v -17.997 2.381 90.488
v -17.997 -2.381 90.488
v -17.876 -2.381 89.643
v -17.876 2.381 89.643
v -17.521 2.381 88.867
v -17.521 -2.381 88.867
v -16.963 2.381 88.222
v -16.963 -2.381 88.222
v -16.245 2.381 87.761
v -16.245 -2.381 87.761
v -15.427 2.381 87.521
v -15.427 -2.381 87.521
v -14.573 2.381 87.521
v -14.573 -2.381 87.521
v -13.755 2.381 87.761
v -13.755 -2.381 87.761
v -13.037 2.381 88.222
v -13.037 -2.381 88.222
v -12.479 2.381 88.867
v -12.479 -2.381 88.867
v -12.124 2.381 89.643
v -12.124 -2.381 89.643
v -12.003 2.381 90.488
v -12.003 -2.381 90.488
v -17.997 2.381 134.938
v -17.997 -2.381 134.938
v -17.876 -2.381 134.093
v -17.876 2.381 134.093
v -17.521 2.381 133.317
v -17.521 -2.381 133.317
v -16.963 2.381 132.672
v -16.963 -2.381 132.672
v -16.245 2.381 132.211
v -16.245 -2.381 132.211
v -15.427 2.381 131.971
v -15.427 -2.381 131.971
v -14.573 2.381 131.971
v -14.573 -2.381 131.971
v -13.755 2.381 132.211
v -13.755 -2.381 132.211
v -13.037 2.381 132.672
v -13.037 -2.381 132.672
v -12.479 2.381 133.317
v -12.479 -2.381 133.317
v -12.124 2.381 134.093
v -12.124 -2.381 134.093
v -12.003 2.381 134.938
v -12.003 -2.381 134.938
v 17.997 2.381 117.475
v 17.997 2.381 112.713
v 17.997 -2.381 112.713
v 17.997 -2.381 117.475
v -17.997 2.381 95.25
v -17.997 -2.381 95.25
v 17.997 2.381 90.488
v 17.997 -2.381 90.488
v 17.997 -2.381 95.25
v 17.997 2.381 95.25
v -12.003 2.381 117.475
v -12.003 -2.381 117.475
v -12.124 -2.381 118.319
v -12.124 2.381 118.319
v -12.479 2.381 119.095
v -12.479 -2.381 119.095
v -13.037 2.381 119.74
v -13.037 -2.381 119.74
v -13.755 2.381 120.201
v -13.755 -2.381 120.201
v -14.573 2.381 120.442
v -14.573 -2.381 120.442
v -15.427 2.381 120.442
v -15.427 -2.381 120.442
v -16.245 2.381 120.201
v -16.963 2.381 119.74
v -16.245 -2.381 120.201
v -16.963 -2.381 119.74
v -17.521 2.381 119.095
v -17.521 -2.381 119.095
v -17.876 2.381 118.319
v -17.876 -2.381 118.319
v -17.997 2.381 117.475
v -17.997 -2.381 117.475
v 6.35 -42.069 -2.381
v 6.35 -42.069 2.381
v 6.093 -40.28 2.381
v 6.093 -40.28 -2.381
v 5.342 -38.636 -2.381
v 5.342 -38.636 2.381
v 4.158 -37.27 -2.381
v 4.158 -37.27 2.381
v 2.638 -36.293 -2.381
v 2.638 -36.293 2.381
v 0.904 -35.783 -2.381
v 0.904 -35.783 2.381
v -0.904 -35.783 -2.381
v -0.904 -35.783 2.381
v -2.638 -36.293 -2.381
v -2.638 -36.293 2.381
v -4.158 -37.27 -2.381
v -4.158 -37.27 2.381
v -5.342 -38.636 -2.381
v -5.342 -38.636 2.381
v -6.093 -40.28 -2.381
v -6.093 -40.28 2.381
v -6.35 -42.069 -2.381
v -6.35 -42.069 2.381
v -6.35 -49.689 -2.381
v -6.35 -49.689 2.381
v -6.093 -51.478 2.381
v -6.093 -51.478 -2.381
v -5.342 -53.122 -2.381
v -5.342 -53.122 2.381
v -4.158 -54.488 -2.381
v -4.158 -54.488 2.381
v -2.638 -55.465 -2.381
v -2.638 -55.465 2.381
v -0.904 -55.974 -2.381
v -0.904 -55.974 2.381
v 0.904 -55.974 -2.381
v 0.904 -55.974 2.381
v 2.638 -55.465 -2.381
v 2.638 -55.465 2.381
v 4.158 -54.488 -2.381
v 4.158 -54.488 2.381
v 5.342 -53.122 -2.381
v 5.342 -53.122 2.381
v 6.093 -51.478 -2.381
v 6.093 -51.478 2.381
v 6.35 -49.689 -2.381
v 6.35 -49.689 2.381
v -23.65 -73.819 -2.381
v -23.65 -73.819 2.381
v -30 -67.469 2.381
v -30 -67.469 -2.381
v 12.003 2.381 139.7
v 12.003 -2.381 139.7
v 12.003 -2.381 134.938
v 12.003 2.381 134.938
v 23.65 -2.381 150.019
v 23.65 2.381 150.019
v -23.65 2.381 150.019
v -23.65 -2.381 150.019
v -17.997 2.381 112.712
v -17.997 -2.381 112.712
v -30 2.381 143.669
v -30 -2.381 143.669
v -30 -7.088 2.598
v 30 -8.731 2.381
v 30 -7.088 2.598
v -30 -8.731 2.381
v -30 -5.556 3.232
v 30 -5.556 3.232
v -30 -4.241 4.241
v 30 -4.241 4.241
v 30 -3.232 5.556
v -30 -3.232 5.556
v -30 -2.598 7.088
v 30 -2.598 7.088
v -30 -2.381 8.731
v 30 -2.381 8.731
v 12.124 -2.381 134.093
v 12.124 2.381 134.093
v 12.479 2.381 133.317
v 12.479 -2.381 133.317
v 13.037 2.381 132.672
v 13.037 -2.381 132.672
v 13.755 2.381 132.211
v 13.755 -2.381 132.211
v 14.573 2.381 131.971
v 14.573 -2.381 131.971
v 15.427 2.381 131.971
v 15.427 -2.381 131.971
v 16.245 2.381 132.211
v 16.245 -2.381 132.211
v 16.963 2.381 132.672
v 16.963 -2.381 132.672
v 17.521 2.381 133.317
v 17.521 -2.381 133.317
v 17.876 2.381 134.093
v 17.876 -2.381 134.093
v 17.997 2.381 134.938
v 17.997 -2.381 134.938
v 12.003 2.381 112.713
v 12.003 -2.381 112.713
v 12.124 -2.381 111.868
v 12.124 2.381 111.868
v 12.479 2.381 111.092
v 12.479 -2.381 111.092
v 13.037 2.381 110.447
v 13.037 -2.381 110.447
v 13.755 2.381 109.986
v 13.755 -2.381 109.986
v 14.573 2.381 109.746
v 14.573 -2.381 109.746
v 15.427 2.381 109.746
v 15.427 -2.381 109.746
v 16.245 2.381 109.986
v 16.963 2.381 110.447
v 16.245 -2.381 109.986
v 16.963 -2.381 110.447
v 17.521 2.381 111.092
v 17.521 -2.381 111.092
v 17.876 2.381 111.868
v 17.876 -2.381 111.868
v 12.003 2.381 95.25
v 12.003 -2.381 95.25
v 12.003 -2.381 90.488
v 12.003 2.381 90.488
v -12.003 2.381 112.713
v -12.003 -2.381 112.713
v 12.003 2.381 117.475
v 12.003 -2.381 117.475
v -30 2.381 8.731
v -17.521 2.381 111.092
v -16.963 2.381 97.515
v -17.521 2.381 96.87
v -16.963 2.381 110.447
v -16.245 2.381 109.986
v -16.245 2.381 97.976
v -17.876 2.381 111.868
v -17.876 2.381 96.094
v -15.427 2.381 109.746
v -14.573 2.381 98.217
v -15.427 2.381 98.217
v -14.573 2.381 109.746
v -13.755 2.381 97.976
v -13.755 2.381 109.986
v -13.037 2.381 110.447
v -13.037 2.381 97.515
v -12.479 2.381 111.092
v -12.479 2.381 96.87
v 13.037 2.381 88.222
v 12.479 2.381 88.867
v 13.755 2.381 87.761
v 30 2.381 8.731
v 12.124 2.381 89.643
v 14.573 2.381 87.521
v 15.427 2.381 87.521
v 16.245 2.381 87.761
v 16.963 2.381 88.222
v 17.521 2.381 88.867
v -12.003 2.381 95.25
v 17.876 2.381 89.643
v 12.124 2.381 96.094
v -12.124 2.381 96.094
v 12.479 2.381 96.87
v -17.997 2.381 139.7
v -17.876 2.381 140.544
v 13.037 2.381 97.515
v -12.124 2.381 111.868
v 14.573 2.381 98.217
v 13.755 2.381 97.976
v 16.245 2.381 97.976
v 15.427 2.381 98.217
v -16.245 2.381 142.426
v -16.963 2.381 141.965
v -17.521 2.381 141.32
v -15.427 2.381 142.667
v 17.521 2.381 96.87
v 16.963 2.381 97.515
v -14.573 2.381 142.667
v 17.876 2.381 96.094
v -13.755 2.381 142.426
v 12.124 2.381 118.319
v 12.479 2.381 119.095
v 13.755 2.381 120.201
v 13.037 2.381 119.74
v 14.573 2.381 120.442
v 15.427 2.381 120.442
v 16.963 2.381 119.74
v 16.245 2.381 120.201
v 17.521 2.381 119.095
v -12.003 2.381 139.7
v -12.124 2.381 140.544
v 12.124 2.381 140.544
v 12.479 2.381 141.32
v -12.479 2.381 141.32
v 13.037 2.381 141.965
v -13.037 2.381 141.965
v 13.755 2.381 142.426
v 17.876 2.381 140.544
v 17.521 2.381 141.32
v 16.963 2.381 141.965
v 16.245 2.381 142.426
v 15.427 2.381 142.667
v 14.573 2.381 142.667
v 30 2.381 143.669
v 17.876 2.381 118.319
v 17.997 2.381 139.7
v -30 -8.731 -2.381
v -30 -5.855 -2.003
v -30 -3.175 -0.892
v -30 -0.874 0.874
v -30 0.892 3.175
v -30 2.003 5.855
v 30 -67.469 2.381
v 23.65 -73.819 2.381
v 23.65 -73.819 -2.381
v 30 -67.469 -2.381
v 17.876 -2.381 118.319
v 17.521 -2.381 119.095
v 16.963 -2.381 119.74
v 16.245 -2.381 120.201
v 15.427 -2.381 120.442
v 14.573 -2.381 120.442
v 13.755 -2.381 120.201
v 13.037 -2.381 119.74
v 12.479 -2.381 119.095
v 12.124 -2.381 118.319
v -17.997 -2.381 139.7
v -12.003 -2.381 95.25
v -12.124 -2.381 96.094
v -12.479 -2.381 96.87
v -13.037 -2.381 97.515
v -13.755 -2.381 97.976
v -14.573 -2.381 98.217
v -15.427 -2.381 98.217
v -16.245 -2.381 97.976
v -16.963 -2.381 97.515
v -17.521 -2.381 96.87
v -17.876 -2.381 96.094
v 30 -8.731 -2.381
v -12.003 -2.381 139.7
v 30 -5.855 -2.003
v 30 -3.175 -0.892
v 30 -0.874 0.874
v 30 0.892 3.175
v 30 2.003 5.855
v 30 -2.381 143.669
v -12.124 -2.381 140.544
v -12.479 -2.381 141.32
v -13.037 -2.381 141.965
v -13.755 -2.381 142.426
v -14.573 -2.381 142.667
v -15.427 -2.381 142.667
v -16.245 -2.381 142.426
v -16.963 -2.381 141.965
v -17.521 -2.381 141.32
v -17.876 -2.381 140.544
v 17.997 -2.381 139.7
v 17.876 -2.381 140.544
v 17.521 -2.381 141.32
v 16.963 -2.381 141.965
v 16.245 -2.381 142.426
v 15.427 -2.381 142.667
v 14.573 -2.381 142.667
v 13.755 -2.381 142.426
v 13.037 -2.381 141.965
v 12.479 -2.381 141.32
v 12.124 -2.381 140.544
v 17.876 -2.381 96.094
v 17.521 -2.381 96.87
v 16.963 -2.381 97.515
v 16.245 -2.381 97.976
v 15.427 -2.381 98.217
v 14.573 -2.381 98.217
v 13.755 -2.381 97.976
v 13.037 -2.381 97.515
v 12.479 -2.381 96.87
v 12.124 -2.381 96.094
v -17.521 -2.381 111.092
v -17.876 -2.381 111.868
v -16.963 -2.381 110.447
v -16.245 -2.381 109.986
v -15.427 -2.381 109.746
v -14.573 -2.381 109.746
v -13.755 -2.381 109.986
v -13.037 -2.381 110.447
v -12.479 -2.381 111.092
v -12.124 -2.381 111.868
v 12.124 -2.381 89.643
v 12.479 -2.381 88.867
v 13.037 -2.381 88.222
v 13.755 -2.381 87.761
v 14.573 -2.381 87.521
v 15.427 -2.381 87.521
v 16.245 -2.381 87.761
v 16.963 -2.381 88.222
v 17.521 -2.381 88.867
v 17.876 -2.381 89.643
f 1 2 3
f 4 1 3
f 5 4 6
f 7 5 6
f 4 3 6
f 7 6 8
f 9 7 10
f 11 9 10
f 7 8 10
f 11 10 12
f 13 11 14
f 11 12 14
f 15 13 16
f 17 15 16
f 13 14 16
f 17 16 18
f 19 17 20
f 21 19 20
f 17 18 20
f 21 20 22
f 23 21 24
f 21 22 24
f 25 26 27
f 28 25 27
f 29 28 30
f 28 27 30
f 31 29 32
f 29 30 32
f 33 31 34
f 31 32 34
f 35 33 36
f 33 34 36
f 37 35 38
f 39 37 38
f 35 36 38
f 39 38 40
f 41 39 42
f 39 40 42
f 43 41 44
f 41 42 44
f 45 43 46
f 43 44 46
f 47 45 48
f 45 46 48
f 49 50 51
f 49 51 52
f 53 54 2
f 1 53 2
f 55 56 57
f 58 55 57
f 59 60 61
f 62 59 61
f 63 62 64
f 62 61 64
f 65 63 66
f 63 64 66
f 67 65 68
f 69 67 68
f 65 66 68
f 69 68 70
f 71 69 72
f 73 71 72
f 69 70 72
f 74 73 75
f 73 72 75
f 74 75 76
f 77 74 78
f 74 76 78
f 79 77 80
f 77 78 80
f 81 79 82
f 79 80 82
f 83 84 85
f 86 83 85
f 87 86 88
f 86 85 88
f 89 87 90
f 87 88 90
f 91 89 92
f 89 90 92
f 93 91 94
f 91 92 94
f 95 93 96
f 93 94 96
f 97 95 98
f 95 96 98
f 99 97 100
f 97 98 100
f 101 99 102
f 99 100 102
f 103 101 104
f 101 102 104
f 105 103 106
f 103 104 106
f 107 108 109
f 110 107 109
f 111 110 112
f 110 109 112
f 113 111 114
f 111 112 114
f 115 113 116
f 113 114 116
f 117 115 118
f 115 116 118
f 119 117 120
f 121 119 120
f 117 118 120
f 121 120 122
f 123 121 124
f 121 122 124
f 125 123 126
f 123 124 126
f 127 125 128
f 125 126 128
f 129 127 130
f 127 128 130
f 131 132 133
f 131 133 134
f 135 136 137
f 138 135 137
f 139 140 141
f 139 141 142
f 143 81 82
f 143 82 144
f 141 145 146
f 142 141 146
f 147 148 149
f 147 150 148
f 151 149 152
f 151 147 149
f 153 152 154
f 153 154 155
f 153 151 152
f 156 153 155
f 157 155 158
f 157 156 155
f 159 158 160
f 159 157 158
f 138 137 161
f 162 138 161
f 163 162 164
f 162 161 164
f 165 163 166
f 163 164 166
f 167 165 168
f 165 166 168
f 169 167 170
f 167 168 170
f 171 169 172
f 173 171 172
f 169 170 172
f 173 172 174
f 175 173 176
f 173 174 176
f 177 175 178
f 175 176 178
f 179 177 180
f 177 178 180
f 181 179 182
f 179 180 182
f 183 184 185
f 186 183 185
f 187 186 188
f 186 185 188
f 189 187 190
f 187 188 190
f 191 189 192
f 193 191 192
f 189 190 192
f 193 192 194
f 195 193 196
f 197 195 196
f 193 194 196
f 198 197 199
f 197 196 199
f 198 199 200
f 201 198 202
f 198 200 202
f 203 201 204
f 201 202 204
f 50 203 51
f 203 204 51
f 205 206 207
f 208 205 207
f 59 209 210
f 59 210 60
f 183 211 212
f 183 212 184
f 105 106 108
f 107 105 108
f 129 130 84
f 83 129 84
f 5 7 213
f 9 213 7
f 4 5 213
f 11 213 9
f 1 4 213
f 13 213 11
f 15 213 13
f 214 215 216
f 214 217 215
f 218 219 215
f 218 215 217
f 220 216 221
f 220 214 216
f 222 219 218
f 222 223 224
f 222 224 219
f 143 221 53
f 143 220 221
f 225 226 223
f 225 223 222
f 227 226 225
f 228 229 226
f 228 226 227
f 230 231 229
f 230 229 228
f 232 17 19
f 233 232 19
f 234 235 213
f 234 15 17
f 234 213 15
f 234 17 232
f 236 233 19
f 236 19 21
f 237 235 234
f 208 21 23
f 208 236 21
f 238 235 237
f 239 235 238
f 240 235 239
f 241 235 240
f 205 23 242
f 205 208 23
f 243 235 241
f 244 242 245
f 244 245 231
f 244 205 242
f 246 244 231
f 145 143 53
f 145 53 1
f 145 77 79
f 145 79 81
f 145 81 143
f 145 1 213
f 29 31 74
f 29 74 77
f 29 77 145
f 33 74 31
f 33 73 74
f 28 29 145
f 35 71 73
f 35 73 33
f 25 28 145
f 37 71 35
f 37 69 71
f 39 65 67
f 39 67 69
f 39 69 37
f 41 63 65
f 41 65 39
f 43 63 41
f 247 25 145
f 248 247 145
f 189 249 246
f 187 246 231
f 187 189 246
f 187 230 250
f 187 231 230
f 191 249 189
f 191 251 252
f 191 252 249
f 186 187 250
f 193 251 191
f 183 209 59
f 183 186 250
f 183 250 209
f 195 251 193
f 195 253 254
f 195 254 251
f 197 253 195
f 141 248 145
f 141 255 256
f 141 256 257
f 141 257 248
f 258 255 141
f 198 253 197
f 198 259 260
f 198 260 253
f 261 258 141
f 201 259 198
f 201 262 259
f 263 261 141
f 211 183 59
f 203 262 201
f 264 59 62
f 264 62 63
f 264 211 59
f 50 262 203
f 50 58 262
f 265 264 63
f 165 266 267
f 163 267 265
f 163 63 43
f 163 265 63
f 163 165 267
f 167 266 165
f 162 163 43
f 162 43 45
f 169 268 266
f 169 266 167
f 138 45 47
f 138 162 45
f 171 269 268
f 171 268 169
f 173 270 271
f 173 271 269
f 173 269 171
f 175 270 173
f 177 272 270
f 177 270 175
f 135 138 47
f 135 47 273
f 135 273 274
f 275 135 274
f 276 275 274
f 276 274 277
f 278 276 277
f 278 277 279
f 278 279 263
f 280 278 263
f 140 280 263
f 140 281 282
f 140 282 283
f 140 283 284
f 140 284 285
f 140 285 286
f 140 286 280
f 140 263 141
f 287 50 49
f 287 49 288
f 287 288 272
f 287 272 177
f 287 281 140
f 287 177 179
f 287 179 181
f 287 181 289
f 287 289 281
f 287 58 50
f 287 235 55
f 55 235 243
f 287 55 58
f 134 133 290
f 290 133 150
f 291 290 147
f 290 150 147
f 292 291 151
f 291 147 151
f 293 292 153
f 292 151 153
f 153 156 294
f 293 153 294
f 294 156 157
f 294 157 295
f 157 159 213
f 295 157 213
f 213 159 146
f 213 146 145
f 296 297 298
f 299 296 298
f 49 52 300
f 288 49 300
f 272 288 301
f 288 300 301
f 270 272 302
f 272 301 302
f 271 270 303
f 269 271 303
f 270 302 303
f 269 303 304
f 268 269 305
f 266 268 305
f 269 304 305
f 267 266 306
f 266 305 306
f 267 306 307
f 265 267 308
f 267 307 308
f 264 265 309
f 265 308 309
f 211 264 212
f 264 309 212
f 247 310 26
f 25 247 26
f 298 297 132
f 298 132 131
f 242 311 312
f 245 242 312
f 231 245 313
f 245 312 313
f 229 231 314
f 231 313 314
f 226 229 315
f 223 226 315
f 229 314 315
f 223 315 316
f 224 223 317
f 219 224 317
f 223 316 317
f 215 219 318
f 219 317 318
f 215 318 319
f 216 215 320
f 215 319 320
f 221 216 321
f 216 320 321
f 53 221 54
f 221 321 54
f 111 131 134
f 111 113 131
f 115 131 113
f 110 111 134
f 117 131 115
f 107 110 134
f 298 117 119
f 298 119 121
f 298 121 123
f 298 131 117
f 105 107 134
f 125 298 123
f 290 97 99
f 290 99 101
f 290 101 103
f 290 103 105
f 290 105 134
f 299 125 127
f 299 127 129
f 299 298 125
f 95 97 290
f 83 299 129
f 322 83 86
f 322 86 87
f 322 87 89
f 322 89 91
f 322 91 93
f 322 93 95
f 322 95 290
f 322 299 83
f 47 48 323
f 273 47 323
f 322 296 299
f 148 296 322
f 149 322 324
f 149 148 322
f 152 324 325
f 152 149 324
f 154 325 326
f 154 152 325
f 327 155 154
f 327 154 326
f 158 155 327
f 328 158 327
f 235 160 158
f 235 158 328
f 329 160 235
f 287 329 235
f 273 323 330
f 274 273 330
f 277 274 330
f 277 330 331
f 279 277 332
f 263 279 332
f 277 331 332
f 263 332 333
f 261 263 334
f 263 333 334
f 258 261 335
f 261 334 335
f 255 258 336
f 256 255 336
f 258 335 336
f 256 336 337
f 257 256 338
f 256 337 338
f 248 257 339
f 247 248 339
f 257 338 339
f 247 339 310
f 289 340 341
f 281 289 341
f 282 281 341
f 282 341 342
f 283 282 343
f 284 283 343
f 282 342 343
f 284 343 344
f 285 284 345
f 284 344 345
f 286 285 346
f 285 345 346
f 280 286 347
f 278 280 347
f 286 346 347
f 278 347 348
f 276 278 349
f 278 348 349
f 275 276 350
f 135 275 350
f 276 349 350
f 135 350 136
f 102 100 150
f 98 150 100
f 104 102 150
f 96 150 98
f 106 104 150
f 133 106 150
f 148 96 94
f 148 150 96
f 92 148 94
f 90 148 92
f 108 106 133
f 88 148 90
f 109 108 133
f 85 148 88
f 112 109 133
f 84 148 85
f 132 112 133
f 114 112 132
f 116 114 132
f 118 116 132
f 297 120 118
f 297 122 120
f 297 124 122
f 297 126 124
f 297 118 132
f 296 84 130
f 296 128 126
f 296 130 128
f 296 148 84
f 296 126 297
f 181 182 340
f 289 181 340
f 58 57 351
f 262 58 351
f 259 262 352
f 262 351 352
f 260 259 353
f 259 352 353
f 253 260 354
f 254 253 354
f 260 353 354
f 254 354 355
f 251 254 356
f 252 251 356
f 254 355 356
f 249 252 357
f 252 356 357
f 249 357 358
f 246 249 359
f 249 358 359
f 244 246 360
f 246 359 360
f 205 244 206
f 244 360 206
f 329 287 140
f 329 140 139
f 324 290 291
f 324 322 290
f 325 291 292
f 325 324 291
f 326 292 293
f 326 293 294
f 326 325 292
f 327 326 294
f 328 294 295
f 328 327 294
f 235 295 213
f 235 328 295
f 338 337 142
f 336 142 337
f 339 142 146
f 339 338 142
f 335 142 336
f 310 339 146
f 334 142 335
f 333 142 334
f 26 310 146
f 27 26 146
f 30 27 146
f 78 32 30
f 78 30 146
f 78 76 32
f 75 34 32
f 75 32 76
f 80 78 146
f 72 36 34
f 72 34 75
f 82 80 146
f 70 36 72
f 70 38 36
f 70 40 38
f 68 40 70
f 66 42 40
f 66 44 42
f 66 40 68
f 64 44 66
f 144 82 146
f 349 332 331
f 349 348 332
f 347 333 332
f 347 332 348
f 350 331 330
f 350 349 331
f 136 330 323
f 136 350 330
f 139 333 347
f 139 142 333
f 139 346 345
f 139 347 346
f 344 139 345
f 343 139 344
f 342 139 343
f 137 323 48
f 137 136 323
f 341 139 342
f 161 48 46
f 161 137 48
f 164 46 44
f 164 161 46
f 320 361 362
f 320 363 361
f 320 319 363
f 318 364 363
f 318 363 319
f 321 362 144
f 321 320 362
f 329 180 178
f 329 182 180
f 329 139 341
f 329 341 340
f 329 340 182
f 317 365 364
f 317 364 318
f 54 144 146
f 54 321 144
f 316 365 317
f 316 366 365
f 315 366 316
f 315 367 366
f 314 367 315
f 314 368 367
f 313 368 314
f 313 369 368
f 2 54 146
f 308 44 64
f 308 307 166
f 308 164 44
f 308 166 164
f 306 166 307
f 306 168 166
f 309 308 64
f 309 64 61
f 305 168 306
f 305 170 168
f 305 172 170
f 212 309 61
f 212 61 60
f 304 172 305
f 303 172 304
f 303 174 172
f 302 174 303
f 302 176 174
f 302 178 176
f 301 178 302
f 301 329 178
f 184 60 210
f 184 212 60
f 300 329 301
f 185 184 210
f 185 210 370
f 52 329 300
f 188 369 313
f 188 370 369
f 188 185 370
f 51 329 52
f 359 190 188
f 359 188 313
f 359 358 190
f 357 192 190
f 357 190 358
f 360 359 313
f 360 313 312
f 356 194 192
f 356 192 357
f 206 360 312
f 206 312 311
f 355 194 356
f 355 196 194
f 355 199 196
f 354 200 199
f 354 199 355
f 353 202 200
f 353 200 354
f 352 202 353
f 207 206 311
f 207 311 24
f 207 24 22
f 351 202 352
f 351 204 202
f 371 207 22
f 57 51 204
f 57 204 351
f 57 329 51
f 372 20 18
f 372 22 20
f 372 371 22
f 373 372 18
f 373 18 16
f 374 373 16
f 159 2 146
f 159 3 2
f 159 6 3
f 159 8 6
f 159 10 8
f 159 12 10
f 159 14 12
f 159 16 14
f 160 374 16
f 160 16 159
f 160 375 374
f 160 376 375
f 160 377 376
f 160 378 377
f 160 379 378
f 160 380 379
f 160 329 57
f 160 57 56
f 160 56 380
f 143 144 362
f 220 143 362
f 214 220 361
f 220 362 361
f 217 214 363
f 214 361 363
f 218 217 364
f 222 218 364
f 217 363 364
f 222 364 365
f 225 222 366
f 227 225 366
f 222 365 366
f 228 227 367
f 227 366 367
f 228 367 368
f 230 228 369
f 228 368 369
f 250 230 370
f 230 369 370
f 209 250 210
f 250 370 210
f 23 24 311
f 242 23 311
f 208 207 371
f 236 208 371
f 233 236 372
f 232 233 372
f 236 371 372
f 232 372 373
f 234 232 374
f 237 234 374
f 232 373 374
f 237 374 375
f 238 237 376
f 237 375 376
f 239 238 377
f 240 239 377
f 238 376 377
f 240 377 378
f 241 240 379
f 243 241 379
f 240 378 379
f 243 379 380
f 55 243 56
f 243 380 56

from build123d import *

# Parameters (mm, degrees)
F1_DEPTH = 30
F2_R     = 6.35
F3_R     = 11.1125
F4_SIZE  = 6.35
F6_DEPTH = 4.7635
F7_DEPTH = 4.7635
F9_DEPTH = 4.7635


with BuildPart() as f1:
    # F0 (on Right) → F1 (new body, symmetric)
    with BuildSketch(Plane.YZ):
        Polygon((-2.38125, 2.38125), (-73.81875, 2.38125), (-73.81875, -2.38125), (2.38125, -2.38125), (2.38125, 150.01875), (-2.38125, 150.01875), align=None)
    extrude(amount=F1_DEPTH, both=True)

    # F2
    f2_edges = [f1.edges().sort_by_distance(p)[0] for p in [
        (0, -2.38125, 2.38125),
    ]]
    fillet(f2_edges, radius=F2_R)

    # F3
    f3_edges = [f1.edges().sort_by_distance(p)[0] for p in [
        (0, 2.38125, -2.38125),
    ]]
    fillet(f3_edges, radius=F3_R)

    # F4
    f4_edges = [f1.edges().sort_by_distance(p)[0] for p in [
        (30, 0, 150.01875),
        (-30, 0, 150.01875),
        (-30, -73.81875, 0),
        (30, -73.81875, 0),
    ]]
    chamfer(f4_edges, length=F4_SIZE)

    # F5 (on face) → F6 (cut, through all)
    with BuildSketch(Plane.XY.offset(2.38125)):
        with BuildLine():
            ThreePointArc((5.08, -45.87875), (6.0241389426, -44.0767963142), (6.35, -42.06875))
            ThreePointArc((6.35, -42.06875), (0, -35.71875), (-6.35, -42.06875))
            ThreePointArc((-6.35, -42.06875), (-6.0241389426, -44.0767963142), (-5.08, -45.87875))
            ThreePointArc((-5.08, -45.87875), (0, -43.33875), (5.08, -45.87875))
        make_face()
        with BuildLine():
            Line((6.35, -49.68875), (6.35, -42.06875))
            ThreePointArc((6.35, -42.06875), (6.0241389426, -44.0767963142), (5.08, -45.87875))
            ThreePointArc((5.08, -45.87875), (6.0241389426, -47.6807036858), (6.35, -49.68875))
        make_face()
        with BuildLine():
            ThreePointArc((-5.08, -45.87875), (-6.0241389426, -44.0767963142), (-6.35, -42.06875))
            Line((-6.35, -42.06875), (-6.35, -49.68875))
            ThreePointArc((-6.35, -49.68875), (-6.0241389426, -47.6807036858), (-5.08, -45.87875))
        make_face()
        with BuildLine():
            ThreePointArc((6.35, -49.68875), (6.0241389426, -47.6807036858), (5.08, -45.87875))
            ThreePointArc((5.08, -45.87875), (0, -48.41875), (-5.08, -45.87875))
            ThreePointArc((-5.08, -45.87875), (-6.0241389426, -47.6807036858), (-6.35, -49.68875))
            ThreePointArc((-6.35, -49.68875), (0, -56.03875), (6.35, -49.68875))
        make_face()
    extrude(amount=-F6_DEPTH, mode=Mode.SUBTRACT)

    # F5 (on face) + F6_face (on face) → F7 (cut, through all)
    with BuildSketch(Plane.XY.offset(2.38125)):
        with BuildLine():
            ThreePointArc((5.08, -45.87875), (6.0241389426, -44.0767963142), (6.35, -42.06875))
            ThreePointArc((6.35, -42.06875), (0, -35.71875), (-6.35, -42.06875))
            ThreePointArc((-6.35, -42.06875), (-6.0241389426, -44.0767963142), (-5.08, -45.87875))
            ThreePointArc((-5.08, -45.87875), (0, -43.33875), (5.08, -45.87875))
        make_face()
        with BuildLine():
            Line((6.35, -49.68875), (6.35, -42.06875))
            ThreePointArc((6.35, -42.06875), (6.0241389426, -44.0767963142), (5.08, -45.87875))
            ThreePointArc((5.08, -45.87875), (6.0241389426, -47.6807036858), (6.35, -49.68875))
        make_face()
        with BuildLine():
            ThreePointArc((-5.08, -45.87875), (-6.0241389426, -44.0767963142), (-6.35, -42.06875))
            Line((-6.35, -42.06875), (-6.35, -49.68875))
            ThreePointArc((-6.35, -49.68875), (-6.0241389426, -47.6807036858), (-5.08, -45.87875))
        make_face()
        with BuildLine():
            ThreePointArc((6.35, -49.68875), (6.0241389426, -47.6807036858), (5.08, -45.87875))
            ThreePointArc((5.08, -45.87875), (0, -48.41875), (-5.08, -45.87875))
            ThreePointArc((-5.08, -45.87875), (-6.0241389426, -47.6807036858), (-6.35, -49.68875))
            ThreePointArc((-6.35, -49.68875), (0, -56.03875), (6.35, -49.68875))
        make_face()
    with BuildSketch(Plane(origin=(0, -45.87875, 2.38125), x_dir=(1, 0, 0), z_dir=(0, 0, 1))):
        with BuildLine():
            ThreePointArc((5.08, 0), (0, 2.54), (-5.08, 0))
            ThreePointArc((-5.08, 0), (0, -2.54), (5.08, 0))
        make_face()
    extrude(amount=-F7_DEPTH, mode=Mode.SUBTRACT)

    # F8 (on face) → F9 (cut, through all)
    with BuildSketch(Plane.XZ.offset(2.38125)):
        with BuildLine():
            ThreePointArc((-16.8201253466, 137.31875), (-17.686865044, 138.371856907), (-17.9972, 139.7))
            Line((-17.9972, 139.7), (-17.9972, 134.9375))
            ThreePointArc((-17.9972, 134.9375), (-17.686865044, 136.265643093), (-16.8201253466, 137.31875))
        make_face()
        with BuildLine():
            Line((-12.0028, 134.9375), (-12.0028, 139.7))
            ThreePointArc((-12.0028, 139.7), (-12.313134956, 138.371856907), (-13.1798746534, 137.31875))
            ThreePointArc((-13.1798746534, 137.31875), (-12.313134956, 136.265643093), (-12.0028, 134.9375))
        make_face()
        with BuildLine():
            ThreePointArc((-13.1798746534, 115.09375), (-12.313134956, 114.040643093), (-12.0028, 112.7125))
            Line((-12.0028, 112.7125), (-12.0028, 117.475))
            ThreePointArc((-12.0028, 117.475), (-12.313134956, 116.146856907), (-13.1798746534, 115.09375))
        make_face()
        with BuildLine():
            Line((-17.9972, 117.475), (-17.9972, 112.7125))
            ThreePointArc((-17.9972, 112.7125), (-17.686865044, 114.040643093), (-16.8201253466, 115.09375))
            ThreePointArc((-16.8201253466, 115.09375), (-17.686865044, 116.146856907), (-17.9972, 117.475))
        make_face()
        with BuildLine():
            ThreePointArc((-13.1798746534, 92.86875), (-12.313134956, 91.815643093), (-12.0028, 90.4875))
            Line((-12.0028, 90.4875), (-12.0028, 95.25))
            ThreePointArc((-12.0028, 95.25), (-12.313134956, 93.921856907), (-13.1798746534, 92.86875))
        make_face()
        with BuildLine():
            Line((-17.9972, 95.25), (-17.9972, 90.4875))
            ThreePointArc((-17.9972, 90.4875), (-17.686865044, 91.815643093), (-16.8201253466, 92.86875))
            ThreePointArc((-16.8201253466, 92.86875), (-17.686865044, 93.921856907), (-17.9972, 95.25))
        make_face()
        with BuildLine():
            ThreePointArc((13.1798746534, 92.86875), (12.313134956, 93.921856907), (12.0028, 95.25))
            Line((12.0028, 95.25), (12.0028, 90.4875))
            ThreePointArc((12.0028, 90.4875), (12.313134956, 91.815643093), (13.1798746534, 92.86875))
        make_face()
        with BuildLine():
            Line((17.9972, 90.4875), (17.9972, 95.25))
            ThreePointArc((17.9972, 95.25), (17.686865044, 93.921856907), (16.8201253466, 92.86875))
            ThreePointArc((16.8201253466, 92.86875), (17.686865044, 91.815643093), (17.9972, 90.4875))
        make_face()
        with BuildLine():
            Line((17.9972, 112.7125), (17.9972, 117.475))
            ThreePointArc((17.9972, 117.475), (17.686865044, 116.146856907), (16.8201253466, 115.09375))
            ThreePointArc((16.8201253466, 115.09375), (17.686865044, 114.040643093), (17.9972, 112.7125))
        make_face()
        with BuildLine():
            ThreePointArc((13.1798746534, 137.31875), (12.313134956, 138.371856907), (12.0028, 139.7))
            Line((12.0028, 139.7), (12.0028, 134.9375))
            ThreePointArc((12.0028, 134.9375), (12.313134956, 136.265643093), (13.1798746534, 137.31875))
        make_face()
        with BuildLine():
            Line((17.9972, 134.9375), (17.9972, 139.7))
            ThreePointArc((17.9972, 139.7), (17.686865044, 138.371856907), (16.8201253466, 137.31875))
            ThreePointArc((16.8201253466, 137.31875), (17.686865044, 136.265643093), (17.9972, 134.9375))
        make_face()
        with BuildLine():
            ThreePointArc((13.1798746534, 115.09375), (12.313134956, 116.146856907), (12.0028, 117.475))
            Line((12.0028, 117.475), (12.0028, 112.7125))
            ThreePointArc((12.0028, 112.7125), (12.313134956, 114.040643093), (13.1798746534, 115.09375))
        make_face()
        with BuildLine():
            ThreePointArc((-12.0028, 134.9375), (-12.313134956, 136.265643093), (-13.1798746534, 137.31875))
            ThreePointArc((-13.1798746534, 137.31875), (-15, 136.7028), (-16.8201253466, 137.31875))
            ThreePointArc((-16.8201253466, 137.31875), (-17.686865044, 136.265643093), (-17.9972, 134.9375))
            ThreePointArc((-17.9972, 134.9375), (-15, 131.9403), (-12.0028, 134.9375))
        make_face()
        with BuildLine():
            ThreePointArc((-16.8201253466, 115.09375), (-17.686865044, 114.040643093), (-17.9972, 112.7125))
            ThreePointArc((-17.9972, 112.7125), (-15, 109.7153), (-12.0028, 112.7125))
            ThreePointArc((-12.0028, 112.7125), (-12.313134956, 114.040643093), (-13.1798746534, 115.09375))
            ThreePointArc((-13.1798746534, 115.09375), (-15, 114.4778), (-16.8201253466, 115.09375))
        make_face()
        with BuildLine():
            ThreePointArc((-17.9972, 117.475), (-17.686865044, 116.146856907), (-16.8201253466, 115.09375))
            ThreePointArc((-16.8201253466, 115.09375), (-15, 115.7097), (-13.1798746534, 115.09375))
            ThreePointArc((-13.1798746534, 115.09375), (-12.313134956, 116.146856907), (-12.0028, 117.475))
            ThreePointArc((-12.0028, 117.475), (-15, 120.4722), (-17.9972, 117.475))
        make_face()
        with BuildLine():
            ThreePointArc((-16.8201253466, 92.86875), (-17.686865044, 91.815643093), (-17.9972, 90.4875))
            ThreePointArc((-17.9972, 90.4875), (-15, 87.4903), (-12.0028, 90.4875))
            ThreePointArc((-12.0028, 90.4875), (-12.313134956, 91.815643093), (-13.1798746534, 92.86875))
            ThreePointArc((-13.1798746534, 92.86875), (-15, 92.2528), (-16.8201253466, 92.86875))
        make_face()
        with BuildLine():
            ThreePointArc((-17.9972, 95.25), (-17.686865044, 93.921856907), (-16.8201253466, 92.86875))
            ThreePointArc((-16.8201253466, 92.86875), (-15, 93.4847), (-13.1798746534, 92.86875))
            ThreePointArc((-13.1798746534, 92.86875), (-12.313134956, 93.921856907), (-12.0028, 95.25))
            ThreePointArc((-12.0028, 95.25), (-15, 98.2472), (-17.9972, 95.25))
        make_face()
        with BuildLine():
            ThreePointArc((17.9972, 139.7), (15, 142.6972), (12.0028, 139.7))
            ThreePointArc((12.0028, 139.7), (12.313134956, 138.371856907), (13.1798746534, 137.31875))
            ThreePointArc((13.1798746534, 137.31875), (15, 137.9347), (16.8201253466, 137.31875))
            ThreePointArc((16.8201253466, 137.31875), (17.686865044, 138.371856907), (17.9972, 139.7))
        make_face()
        with BuildLine():
            ThreePointArc((13.1798746534, 137.31875), (12.313134956, 136.265643093), (12.0028, 134.9375))
            ThreePointArc((12.0028, 134.9375), (15, 131.9403), (17.9972, 134.9375))
            ThreePointArc((17.9972, 134.9375), (17.686865044, 136.265643093), (16.8201253466, 137.31875))
            ThreePointArc((16.8201253466, 137.31875), (15, 136.7028), (13.1798746534, 137.31875))
        make_face()
        with BuildLine():
            ThreePointArc((17.9972, 95.25), (15, 98.2472), (12.0028, 95.25))
            ThreePointArc((12.0028, 95.25), (12.313134956, 93.921856907), (13.1798746534, 92.86875))
            ThreePointArc((13.1798746534, 92.86875), (15, 93.4847), (16.8201253466, 92.86875))
            ThreePointArc((16.8201253466, 92.86875), (17.686865044, 93.921856907), (17.9972, 95.25))
        make_face()
        with BuildLine():
            ThreePointArc((13.1798746534, 92.86875), (12.313134956, 91.815643093), (12.0028, 90.4875))
            ThreePointArc((12.0028, 90.4875), (15, 87.4903), (17.9972, 90.4875))
            ThreePointArc((17.9972, 90.4875), (17.686865044, 91.815643093), (16.8201253466, 92.86875))
            ThreePointArc((16.8201253466, 92.86875), (15, 92.2528), (13.1798746534, 92.86875))
        make_face()
        with BuildLine():
            ThreePointArc((16.8201253466, 115.09375), (17.686865044, 116.146856907), (17.9972, 117.475))
            ThreePointArc((17.9972, 117.475), (15, 120.4722), (12.0028, 117.475))
            ThreePointArc((12.0028, 117.475), (12.313134956, 116.146856907), (13.1798746534, 115.09375))
            ThreePointArc((13.1798746534, 115.09375), (15, 115.7097), (16.8201253466, 115.09375))
        make_face()
        with BuildLine():
            ThreePointArc((12.0028, 112.7125), (15, 109.7153), (17.9972, 112.7125))
            ThreePointArc((17.9972, 112.7125), (17.686865044, 114.040643093), (16.8201253466, 115.09375))
            ThreePointArc((16.8201253466, 115.09375), (15, 114.4778), (13.1798746534, 115.09375))
            ThreePointArc((13.1798746534, 115.09375), (12.313134956, 114.040643093), (12.0028, 112.7125))
        make_face()
        with BuildLine():
            ThreePointArc((-16.8201253466, 137.31875), (-15, 136.7028), (-13.1798746534, 137.31875))
            ThreePointArc((-13.1798746534, 137.31875), (-15, 137.9347), (-16.8201253466, 137.31875))
        make_face()
        with BuildLine():
            ThreePointArc((-13.1798746534, 137.31875), (-12.313134956, 138.371856907), (-12.0028, 139.7))
            ThreePointArc((-12.0028, 139.7), (-15, 142.6972), (-17.9972, 139.7))
            ThreePointArc((-17.9972, 139.7), (-17.686865044, 138.371856907), (-16.8201253466, 137.31875))
            ThreePointArc((-16.8201253466, 137.31875), (-15, 137.9347), (-13.1798746534, 137.31875))
        make_face()
        with BuildLine():
            ThreePointArc((-13.1798746534, 115.09375), (-15, 115.7097), (-16.8201253466, 115.09375))
            ThreePointArc((-16.8201253466, 115.09375), (-15, 114.4778), (-13.1798746534, 115.09375))
        make_face()
        with BuildLine():
            ThreePointArc((16.8201253466, 137.31875), (15, 137.9347), (13.1798746534, 137.31875))
            ThreePointArc((13.1798746534, 137.31875), (15, 136.7028), (16.8201253466, 137.31875))
        make_face()
        with BuildLine():
            ThreePointArc((13.1798746534, 115.09375), (15, 114.4778), (16.8201253466, 115.09375))
            ThreePointArc((16.8201253466, 115.09375), (15, 115.7097), (13.1798746534, 115.09375))
        make_face()
        with BuildLine():
            ThreePointArc((16.8201253466, 92.86875), (15, 93.4847), (13.1798746534, 92.86875))
            ThreePointArc((13.1798746534, 92.86875), (15, 92.2528), (16.8201253466, 92.86875))
        make_face()
        with BuildLine():
            ThreePointArc((-13.1798746534, 92.86875), (-15, 93.4847), (-16.8201253466, 92.86875))
            ThreePointArc((-16.8201253466, 92.86875), (-15, 92.2528), (-13.1798746534, 92.86875))
        make_face()
    extrude(amount=-F9_DEPTH, mode=Mode.SUBTRACT)


solid = f1.part
